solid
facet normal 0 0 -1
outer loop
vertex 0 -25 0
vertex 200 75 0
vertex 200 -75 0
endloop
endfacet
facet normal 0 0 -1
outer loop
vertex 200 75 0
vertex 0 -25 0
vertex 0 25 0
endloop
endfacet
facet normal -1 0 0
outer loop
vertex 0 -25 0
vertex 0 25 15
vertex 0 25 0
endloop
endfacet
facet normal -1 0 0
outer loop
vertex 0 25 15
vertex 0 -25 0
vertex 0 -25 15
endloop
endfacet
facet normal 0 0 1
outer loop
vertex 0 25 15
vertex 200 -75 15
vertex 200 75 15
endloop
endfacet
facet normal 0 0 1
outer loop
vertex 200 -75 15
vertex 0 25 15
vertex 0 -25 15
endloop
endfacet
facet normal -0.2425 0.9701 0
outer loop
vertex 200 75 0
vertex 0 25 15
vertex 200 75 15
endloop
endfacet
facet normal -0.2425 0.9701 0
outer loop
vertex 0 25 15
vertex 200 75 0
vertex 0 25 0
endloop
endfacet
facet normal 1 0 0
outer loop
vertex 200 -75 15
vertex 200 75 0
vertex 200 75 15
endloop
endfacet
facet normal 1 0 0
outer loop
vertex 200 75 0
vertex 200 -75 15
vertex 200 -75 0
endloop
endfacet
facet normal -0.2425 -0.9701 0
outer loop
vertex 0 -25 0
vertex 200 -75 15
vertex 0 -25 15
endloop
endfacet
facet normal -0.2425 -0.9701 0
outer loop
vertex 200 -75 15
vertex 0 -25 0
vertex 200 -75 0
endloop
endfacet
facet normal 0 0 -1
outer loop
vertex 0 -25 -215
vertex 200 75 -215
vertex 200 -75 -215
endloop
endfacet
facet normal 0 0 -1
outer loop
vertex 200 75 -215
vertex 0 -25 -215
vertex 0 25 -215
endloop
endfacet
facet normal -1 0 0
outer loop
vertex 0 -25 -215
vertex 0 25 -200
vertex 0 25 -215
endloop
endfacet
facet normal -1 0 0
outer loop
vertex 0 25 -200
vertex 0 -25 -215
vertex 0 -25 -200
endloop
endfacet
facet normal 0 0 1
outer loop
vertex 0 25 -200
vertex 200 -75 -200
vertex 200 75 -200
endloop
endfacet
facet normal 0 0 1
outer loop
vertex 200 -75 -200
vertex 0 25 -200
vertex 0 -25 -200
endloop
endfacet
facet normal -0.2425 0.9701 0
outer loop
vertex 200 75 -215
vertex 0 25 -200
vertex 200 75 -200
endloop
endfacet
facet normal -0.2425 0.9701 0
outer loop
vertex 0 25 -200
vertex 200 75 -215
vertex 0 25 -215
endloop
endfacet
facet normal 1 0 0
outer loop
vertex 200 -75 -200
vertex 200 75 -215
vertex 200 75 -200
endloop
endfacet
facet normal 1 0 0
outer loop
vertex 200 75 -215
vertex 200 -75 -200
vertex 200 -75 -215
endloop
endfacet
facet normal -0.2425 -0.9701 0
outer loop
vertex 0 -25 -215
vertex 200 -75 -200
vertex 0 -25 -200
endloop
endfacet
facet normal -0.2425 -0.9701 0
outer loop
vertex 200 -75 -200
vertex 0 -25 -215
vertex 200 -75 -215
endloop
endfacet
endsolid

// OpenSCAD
SiPnl_Top=50;	// Dimension at the top
SiPnl_Base=150;	// Dimension at the base
HoSiPnl=200;		// Height of the sidepanel
SiPnl=15;		// Thickness of the Plywood


BaseX=15;		// Thickness of the Plywood
BaseY=450;		// Dimension Y
BaseZ=300;		// Dimension Z

MntSpce=200;	//Mount Space Frame =HoWshr+HoDZ+HoDAS+HoBar+HoWshr+HoBarEQR+HoWshr

//=================================================
Frame(SiPnl,SiPnl_Top,SiPnl_Base,HoSiPnl,MntSpce);

//Frame();
module Frame(SiPnl,SiPnl_Top,SiPnl_Base,HoSiPnl,MntSpce){
	translate([0,0,SiPnl/2]){
		Wall(SiPnl_Top,SiPnl_Base,HoSiPnl);
	}
	translate([0,0,-MntSpce-SiPnl/2]){
		Wall(SiPnl_Top,SiPnl_Base,HoSiPnl);
	}
	translate([HoSiPnl,0,0]){
	//Base_Plate(SiPnl,MntSpce);
	}
}

//Wall();
module Wall (SiPnl_Top,SiPnl_Base,HoSiPnl,MntSpce){
	linear_extrude(height = SiPnl, center = true, convexity = 10, scale = 1.0, $fn = 16){
		projection(cut=true){
			rotate([0,90,0]){
				cylinder(h=HoSiPnl, d1=SiPnl_Top, d2= SiPnl_Base,center=false);
			}
		}
	}
}

//Base ();
module Base_Plate (SiPnl,MntSpce){	
	cube([BaseX,BaseY,2*(MntSpce+SiPnl)],center=true);
}
